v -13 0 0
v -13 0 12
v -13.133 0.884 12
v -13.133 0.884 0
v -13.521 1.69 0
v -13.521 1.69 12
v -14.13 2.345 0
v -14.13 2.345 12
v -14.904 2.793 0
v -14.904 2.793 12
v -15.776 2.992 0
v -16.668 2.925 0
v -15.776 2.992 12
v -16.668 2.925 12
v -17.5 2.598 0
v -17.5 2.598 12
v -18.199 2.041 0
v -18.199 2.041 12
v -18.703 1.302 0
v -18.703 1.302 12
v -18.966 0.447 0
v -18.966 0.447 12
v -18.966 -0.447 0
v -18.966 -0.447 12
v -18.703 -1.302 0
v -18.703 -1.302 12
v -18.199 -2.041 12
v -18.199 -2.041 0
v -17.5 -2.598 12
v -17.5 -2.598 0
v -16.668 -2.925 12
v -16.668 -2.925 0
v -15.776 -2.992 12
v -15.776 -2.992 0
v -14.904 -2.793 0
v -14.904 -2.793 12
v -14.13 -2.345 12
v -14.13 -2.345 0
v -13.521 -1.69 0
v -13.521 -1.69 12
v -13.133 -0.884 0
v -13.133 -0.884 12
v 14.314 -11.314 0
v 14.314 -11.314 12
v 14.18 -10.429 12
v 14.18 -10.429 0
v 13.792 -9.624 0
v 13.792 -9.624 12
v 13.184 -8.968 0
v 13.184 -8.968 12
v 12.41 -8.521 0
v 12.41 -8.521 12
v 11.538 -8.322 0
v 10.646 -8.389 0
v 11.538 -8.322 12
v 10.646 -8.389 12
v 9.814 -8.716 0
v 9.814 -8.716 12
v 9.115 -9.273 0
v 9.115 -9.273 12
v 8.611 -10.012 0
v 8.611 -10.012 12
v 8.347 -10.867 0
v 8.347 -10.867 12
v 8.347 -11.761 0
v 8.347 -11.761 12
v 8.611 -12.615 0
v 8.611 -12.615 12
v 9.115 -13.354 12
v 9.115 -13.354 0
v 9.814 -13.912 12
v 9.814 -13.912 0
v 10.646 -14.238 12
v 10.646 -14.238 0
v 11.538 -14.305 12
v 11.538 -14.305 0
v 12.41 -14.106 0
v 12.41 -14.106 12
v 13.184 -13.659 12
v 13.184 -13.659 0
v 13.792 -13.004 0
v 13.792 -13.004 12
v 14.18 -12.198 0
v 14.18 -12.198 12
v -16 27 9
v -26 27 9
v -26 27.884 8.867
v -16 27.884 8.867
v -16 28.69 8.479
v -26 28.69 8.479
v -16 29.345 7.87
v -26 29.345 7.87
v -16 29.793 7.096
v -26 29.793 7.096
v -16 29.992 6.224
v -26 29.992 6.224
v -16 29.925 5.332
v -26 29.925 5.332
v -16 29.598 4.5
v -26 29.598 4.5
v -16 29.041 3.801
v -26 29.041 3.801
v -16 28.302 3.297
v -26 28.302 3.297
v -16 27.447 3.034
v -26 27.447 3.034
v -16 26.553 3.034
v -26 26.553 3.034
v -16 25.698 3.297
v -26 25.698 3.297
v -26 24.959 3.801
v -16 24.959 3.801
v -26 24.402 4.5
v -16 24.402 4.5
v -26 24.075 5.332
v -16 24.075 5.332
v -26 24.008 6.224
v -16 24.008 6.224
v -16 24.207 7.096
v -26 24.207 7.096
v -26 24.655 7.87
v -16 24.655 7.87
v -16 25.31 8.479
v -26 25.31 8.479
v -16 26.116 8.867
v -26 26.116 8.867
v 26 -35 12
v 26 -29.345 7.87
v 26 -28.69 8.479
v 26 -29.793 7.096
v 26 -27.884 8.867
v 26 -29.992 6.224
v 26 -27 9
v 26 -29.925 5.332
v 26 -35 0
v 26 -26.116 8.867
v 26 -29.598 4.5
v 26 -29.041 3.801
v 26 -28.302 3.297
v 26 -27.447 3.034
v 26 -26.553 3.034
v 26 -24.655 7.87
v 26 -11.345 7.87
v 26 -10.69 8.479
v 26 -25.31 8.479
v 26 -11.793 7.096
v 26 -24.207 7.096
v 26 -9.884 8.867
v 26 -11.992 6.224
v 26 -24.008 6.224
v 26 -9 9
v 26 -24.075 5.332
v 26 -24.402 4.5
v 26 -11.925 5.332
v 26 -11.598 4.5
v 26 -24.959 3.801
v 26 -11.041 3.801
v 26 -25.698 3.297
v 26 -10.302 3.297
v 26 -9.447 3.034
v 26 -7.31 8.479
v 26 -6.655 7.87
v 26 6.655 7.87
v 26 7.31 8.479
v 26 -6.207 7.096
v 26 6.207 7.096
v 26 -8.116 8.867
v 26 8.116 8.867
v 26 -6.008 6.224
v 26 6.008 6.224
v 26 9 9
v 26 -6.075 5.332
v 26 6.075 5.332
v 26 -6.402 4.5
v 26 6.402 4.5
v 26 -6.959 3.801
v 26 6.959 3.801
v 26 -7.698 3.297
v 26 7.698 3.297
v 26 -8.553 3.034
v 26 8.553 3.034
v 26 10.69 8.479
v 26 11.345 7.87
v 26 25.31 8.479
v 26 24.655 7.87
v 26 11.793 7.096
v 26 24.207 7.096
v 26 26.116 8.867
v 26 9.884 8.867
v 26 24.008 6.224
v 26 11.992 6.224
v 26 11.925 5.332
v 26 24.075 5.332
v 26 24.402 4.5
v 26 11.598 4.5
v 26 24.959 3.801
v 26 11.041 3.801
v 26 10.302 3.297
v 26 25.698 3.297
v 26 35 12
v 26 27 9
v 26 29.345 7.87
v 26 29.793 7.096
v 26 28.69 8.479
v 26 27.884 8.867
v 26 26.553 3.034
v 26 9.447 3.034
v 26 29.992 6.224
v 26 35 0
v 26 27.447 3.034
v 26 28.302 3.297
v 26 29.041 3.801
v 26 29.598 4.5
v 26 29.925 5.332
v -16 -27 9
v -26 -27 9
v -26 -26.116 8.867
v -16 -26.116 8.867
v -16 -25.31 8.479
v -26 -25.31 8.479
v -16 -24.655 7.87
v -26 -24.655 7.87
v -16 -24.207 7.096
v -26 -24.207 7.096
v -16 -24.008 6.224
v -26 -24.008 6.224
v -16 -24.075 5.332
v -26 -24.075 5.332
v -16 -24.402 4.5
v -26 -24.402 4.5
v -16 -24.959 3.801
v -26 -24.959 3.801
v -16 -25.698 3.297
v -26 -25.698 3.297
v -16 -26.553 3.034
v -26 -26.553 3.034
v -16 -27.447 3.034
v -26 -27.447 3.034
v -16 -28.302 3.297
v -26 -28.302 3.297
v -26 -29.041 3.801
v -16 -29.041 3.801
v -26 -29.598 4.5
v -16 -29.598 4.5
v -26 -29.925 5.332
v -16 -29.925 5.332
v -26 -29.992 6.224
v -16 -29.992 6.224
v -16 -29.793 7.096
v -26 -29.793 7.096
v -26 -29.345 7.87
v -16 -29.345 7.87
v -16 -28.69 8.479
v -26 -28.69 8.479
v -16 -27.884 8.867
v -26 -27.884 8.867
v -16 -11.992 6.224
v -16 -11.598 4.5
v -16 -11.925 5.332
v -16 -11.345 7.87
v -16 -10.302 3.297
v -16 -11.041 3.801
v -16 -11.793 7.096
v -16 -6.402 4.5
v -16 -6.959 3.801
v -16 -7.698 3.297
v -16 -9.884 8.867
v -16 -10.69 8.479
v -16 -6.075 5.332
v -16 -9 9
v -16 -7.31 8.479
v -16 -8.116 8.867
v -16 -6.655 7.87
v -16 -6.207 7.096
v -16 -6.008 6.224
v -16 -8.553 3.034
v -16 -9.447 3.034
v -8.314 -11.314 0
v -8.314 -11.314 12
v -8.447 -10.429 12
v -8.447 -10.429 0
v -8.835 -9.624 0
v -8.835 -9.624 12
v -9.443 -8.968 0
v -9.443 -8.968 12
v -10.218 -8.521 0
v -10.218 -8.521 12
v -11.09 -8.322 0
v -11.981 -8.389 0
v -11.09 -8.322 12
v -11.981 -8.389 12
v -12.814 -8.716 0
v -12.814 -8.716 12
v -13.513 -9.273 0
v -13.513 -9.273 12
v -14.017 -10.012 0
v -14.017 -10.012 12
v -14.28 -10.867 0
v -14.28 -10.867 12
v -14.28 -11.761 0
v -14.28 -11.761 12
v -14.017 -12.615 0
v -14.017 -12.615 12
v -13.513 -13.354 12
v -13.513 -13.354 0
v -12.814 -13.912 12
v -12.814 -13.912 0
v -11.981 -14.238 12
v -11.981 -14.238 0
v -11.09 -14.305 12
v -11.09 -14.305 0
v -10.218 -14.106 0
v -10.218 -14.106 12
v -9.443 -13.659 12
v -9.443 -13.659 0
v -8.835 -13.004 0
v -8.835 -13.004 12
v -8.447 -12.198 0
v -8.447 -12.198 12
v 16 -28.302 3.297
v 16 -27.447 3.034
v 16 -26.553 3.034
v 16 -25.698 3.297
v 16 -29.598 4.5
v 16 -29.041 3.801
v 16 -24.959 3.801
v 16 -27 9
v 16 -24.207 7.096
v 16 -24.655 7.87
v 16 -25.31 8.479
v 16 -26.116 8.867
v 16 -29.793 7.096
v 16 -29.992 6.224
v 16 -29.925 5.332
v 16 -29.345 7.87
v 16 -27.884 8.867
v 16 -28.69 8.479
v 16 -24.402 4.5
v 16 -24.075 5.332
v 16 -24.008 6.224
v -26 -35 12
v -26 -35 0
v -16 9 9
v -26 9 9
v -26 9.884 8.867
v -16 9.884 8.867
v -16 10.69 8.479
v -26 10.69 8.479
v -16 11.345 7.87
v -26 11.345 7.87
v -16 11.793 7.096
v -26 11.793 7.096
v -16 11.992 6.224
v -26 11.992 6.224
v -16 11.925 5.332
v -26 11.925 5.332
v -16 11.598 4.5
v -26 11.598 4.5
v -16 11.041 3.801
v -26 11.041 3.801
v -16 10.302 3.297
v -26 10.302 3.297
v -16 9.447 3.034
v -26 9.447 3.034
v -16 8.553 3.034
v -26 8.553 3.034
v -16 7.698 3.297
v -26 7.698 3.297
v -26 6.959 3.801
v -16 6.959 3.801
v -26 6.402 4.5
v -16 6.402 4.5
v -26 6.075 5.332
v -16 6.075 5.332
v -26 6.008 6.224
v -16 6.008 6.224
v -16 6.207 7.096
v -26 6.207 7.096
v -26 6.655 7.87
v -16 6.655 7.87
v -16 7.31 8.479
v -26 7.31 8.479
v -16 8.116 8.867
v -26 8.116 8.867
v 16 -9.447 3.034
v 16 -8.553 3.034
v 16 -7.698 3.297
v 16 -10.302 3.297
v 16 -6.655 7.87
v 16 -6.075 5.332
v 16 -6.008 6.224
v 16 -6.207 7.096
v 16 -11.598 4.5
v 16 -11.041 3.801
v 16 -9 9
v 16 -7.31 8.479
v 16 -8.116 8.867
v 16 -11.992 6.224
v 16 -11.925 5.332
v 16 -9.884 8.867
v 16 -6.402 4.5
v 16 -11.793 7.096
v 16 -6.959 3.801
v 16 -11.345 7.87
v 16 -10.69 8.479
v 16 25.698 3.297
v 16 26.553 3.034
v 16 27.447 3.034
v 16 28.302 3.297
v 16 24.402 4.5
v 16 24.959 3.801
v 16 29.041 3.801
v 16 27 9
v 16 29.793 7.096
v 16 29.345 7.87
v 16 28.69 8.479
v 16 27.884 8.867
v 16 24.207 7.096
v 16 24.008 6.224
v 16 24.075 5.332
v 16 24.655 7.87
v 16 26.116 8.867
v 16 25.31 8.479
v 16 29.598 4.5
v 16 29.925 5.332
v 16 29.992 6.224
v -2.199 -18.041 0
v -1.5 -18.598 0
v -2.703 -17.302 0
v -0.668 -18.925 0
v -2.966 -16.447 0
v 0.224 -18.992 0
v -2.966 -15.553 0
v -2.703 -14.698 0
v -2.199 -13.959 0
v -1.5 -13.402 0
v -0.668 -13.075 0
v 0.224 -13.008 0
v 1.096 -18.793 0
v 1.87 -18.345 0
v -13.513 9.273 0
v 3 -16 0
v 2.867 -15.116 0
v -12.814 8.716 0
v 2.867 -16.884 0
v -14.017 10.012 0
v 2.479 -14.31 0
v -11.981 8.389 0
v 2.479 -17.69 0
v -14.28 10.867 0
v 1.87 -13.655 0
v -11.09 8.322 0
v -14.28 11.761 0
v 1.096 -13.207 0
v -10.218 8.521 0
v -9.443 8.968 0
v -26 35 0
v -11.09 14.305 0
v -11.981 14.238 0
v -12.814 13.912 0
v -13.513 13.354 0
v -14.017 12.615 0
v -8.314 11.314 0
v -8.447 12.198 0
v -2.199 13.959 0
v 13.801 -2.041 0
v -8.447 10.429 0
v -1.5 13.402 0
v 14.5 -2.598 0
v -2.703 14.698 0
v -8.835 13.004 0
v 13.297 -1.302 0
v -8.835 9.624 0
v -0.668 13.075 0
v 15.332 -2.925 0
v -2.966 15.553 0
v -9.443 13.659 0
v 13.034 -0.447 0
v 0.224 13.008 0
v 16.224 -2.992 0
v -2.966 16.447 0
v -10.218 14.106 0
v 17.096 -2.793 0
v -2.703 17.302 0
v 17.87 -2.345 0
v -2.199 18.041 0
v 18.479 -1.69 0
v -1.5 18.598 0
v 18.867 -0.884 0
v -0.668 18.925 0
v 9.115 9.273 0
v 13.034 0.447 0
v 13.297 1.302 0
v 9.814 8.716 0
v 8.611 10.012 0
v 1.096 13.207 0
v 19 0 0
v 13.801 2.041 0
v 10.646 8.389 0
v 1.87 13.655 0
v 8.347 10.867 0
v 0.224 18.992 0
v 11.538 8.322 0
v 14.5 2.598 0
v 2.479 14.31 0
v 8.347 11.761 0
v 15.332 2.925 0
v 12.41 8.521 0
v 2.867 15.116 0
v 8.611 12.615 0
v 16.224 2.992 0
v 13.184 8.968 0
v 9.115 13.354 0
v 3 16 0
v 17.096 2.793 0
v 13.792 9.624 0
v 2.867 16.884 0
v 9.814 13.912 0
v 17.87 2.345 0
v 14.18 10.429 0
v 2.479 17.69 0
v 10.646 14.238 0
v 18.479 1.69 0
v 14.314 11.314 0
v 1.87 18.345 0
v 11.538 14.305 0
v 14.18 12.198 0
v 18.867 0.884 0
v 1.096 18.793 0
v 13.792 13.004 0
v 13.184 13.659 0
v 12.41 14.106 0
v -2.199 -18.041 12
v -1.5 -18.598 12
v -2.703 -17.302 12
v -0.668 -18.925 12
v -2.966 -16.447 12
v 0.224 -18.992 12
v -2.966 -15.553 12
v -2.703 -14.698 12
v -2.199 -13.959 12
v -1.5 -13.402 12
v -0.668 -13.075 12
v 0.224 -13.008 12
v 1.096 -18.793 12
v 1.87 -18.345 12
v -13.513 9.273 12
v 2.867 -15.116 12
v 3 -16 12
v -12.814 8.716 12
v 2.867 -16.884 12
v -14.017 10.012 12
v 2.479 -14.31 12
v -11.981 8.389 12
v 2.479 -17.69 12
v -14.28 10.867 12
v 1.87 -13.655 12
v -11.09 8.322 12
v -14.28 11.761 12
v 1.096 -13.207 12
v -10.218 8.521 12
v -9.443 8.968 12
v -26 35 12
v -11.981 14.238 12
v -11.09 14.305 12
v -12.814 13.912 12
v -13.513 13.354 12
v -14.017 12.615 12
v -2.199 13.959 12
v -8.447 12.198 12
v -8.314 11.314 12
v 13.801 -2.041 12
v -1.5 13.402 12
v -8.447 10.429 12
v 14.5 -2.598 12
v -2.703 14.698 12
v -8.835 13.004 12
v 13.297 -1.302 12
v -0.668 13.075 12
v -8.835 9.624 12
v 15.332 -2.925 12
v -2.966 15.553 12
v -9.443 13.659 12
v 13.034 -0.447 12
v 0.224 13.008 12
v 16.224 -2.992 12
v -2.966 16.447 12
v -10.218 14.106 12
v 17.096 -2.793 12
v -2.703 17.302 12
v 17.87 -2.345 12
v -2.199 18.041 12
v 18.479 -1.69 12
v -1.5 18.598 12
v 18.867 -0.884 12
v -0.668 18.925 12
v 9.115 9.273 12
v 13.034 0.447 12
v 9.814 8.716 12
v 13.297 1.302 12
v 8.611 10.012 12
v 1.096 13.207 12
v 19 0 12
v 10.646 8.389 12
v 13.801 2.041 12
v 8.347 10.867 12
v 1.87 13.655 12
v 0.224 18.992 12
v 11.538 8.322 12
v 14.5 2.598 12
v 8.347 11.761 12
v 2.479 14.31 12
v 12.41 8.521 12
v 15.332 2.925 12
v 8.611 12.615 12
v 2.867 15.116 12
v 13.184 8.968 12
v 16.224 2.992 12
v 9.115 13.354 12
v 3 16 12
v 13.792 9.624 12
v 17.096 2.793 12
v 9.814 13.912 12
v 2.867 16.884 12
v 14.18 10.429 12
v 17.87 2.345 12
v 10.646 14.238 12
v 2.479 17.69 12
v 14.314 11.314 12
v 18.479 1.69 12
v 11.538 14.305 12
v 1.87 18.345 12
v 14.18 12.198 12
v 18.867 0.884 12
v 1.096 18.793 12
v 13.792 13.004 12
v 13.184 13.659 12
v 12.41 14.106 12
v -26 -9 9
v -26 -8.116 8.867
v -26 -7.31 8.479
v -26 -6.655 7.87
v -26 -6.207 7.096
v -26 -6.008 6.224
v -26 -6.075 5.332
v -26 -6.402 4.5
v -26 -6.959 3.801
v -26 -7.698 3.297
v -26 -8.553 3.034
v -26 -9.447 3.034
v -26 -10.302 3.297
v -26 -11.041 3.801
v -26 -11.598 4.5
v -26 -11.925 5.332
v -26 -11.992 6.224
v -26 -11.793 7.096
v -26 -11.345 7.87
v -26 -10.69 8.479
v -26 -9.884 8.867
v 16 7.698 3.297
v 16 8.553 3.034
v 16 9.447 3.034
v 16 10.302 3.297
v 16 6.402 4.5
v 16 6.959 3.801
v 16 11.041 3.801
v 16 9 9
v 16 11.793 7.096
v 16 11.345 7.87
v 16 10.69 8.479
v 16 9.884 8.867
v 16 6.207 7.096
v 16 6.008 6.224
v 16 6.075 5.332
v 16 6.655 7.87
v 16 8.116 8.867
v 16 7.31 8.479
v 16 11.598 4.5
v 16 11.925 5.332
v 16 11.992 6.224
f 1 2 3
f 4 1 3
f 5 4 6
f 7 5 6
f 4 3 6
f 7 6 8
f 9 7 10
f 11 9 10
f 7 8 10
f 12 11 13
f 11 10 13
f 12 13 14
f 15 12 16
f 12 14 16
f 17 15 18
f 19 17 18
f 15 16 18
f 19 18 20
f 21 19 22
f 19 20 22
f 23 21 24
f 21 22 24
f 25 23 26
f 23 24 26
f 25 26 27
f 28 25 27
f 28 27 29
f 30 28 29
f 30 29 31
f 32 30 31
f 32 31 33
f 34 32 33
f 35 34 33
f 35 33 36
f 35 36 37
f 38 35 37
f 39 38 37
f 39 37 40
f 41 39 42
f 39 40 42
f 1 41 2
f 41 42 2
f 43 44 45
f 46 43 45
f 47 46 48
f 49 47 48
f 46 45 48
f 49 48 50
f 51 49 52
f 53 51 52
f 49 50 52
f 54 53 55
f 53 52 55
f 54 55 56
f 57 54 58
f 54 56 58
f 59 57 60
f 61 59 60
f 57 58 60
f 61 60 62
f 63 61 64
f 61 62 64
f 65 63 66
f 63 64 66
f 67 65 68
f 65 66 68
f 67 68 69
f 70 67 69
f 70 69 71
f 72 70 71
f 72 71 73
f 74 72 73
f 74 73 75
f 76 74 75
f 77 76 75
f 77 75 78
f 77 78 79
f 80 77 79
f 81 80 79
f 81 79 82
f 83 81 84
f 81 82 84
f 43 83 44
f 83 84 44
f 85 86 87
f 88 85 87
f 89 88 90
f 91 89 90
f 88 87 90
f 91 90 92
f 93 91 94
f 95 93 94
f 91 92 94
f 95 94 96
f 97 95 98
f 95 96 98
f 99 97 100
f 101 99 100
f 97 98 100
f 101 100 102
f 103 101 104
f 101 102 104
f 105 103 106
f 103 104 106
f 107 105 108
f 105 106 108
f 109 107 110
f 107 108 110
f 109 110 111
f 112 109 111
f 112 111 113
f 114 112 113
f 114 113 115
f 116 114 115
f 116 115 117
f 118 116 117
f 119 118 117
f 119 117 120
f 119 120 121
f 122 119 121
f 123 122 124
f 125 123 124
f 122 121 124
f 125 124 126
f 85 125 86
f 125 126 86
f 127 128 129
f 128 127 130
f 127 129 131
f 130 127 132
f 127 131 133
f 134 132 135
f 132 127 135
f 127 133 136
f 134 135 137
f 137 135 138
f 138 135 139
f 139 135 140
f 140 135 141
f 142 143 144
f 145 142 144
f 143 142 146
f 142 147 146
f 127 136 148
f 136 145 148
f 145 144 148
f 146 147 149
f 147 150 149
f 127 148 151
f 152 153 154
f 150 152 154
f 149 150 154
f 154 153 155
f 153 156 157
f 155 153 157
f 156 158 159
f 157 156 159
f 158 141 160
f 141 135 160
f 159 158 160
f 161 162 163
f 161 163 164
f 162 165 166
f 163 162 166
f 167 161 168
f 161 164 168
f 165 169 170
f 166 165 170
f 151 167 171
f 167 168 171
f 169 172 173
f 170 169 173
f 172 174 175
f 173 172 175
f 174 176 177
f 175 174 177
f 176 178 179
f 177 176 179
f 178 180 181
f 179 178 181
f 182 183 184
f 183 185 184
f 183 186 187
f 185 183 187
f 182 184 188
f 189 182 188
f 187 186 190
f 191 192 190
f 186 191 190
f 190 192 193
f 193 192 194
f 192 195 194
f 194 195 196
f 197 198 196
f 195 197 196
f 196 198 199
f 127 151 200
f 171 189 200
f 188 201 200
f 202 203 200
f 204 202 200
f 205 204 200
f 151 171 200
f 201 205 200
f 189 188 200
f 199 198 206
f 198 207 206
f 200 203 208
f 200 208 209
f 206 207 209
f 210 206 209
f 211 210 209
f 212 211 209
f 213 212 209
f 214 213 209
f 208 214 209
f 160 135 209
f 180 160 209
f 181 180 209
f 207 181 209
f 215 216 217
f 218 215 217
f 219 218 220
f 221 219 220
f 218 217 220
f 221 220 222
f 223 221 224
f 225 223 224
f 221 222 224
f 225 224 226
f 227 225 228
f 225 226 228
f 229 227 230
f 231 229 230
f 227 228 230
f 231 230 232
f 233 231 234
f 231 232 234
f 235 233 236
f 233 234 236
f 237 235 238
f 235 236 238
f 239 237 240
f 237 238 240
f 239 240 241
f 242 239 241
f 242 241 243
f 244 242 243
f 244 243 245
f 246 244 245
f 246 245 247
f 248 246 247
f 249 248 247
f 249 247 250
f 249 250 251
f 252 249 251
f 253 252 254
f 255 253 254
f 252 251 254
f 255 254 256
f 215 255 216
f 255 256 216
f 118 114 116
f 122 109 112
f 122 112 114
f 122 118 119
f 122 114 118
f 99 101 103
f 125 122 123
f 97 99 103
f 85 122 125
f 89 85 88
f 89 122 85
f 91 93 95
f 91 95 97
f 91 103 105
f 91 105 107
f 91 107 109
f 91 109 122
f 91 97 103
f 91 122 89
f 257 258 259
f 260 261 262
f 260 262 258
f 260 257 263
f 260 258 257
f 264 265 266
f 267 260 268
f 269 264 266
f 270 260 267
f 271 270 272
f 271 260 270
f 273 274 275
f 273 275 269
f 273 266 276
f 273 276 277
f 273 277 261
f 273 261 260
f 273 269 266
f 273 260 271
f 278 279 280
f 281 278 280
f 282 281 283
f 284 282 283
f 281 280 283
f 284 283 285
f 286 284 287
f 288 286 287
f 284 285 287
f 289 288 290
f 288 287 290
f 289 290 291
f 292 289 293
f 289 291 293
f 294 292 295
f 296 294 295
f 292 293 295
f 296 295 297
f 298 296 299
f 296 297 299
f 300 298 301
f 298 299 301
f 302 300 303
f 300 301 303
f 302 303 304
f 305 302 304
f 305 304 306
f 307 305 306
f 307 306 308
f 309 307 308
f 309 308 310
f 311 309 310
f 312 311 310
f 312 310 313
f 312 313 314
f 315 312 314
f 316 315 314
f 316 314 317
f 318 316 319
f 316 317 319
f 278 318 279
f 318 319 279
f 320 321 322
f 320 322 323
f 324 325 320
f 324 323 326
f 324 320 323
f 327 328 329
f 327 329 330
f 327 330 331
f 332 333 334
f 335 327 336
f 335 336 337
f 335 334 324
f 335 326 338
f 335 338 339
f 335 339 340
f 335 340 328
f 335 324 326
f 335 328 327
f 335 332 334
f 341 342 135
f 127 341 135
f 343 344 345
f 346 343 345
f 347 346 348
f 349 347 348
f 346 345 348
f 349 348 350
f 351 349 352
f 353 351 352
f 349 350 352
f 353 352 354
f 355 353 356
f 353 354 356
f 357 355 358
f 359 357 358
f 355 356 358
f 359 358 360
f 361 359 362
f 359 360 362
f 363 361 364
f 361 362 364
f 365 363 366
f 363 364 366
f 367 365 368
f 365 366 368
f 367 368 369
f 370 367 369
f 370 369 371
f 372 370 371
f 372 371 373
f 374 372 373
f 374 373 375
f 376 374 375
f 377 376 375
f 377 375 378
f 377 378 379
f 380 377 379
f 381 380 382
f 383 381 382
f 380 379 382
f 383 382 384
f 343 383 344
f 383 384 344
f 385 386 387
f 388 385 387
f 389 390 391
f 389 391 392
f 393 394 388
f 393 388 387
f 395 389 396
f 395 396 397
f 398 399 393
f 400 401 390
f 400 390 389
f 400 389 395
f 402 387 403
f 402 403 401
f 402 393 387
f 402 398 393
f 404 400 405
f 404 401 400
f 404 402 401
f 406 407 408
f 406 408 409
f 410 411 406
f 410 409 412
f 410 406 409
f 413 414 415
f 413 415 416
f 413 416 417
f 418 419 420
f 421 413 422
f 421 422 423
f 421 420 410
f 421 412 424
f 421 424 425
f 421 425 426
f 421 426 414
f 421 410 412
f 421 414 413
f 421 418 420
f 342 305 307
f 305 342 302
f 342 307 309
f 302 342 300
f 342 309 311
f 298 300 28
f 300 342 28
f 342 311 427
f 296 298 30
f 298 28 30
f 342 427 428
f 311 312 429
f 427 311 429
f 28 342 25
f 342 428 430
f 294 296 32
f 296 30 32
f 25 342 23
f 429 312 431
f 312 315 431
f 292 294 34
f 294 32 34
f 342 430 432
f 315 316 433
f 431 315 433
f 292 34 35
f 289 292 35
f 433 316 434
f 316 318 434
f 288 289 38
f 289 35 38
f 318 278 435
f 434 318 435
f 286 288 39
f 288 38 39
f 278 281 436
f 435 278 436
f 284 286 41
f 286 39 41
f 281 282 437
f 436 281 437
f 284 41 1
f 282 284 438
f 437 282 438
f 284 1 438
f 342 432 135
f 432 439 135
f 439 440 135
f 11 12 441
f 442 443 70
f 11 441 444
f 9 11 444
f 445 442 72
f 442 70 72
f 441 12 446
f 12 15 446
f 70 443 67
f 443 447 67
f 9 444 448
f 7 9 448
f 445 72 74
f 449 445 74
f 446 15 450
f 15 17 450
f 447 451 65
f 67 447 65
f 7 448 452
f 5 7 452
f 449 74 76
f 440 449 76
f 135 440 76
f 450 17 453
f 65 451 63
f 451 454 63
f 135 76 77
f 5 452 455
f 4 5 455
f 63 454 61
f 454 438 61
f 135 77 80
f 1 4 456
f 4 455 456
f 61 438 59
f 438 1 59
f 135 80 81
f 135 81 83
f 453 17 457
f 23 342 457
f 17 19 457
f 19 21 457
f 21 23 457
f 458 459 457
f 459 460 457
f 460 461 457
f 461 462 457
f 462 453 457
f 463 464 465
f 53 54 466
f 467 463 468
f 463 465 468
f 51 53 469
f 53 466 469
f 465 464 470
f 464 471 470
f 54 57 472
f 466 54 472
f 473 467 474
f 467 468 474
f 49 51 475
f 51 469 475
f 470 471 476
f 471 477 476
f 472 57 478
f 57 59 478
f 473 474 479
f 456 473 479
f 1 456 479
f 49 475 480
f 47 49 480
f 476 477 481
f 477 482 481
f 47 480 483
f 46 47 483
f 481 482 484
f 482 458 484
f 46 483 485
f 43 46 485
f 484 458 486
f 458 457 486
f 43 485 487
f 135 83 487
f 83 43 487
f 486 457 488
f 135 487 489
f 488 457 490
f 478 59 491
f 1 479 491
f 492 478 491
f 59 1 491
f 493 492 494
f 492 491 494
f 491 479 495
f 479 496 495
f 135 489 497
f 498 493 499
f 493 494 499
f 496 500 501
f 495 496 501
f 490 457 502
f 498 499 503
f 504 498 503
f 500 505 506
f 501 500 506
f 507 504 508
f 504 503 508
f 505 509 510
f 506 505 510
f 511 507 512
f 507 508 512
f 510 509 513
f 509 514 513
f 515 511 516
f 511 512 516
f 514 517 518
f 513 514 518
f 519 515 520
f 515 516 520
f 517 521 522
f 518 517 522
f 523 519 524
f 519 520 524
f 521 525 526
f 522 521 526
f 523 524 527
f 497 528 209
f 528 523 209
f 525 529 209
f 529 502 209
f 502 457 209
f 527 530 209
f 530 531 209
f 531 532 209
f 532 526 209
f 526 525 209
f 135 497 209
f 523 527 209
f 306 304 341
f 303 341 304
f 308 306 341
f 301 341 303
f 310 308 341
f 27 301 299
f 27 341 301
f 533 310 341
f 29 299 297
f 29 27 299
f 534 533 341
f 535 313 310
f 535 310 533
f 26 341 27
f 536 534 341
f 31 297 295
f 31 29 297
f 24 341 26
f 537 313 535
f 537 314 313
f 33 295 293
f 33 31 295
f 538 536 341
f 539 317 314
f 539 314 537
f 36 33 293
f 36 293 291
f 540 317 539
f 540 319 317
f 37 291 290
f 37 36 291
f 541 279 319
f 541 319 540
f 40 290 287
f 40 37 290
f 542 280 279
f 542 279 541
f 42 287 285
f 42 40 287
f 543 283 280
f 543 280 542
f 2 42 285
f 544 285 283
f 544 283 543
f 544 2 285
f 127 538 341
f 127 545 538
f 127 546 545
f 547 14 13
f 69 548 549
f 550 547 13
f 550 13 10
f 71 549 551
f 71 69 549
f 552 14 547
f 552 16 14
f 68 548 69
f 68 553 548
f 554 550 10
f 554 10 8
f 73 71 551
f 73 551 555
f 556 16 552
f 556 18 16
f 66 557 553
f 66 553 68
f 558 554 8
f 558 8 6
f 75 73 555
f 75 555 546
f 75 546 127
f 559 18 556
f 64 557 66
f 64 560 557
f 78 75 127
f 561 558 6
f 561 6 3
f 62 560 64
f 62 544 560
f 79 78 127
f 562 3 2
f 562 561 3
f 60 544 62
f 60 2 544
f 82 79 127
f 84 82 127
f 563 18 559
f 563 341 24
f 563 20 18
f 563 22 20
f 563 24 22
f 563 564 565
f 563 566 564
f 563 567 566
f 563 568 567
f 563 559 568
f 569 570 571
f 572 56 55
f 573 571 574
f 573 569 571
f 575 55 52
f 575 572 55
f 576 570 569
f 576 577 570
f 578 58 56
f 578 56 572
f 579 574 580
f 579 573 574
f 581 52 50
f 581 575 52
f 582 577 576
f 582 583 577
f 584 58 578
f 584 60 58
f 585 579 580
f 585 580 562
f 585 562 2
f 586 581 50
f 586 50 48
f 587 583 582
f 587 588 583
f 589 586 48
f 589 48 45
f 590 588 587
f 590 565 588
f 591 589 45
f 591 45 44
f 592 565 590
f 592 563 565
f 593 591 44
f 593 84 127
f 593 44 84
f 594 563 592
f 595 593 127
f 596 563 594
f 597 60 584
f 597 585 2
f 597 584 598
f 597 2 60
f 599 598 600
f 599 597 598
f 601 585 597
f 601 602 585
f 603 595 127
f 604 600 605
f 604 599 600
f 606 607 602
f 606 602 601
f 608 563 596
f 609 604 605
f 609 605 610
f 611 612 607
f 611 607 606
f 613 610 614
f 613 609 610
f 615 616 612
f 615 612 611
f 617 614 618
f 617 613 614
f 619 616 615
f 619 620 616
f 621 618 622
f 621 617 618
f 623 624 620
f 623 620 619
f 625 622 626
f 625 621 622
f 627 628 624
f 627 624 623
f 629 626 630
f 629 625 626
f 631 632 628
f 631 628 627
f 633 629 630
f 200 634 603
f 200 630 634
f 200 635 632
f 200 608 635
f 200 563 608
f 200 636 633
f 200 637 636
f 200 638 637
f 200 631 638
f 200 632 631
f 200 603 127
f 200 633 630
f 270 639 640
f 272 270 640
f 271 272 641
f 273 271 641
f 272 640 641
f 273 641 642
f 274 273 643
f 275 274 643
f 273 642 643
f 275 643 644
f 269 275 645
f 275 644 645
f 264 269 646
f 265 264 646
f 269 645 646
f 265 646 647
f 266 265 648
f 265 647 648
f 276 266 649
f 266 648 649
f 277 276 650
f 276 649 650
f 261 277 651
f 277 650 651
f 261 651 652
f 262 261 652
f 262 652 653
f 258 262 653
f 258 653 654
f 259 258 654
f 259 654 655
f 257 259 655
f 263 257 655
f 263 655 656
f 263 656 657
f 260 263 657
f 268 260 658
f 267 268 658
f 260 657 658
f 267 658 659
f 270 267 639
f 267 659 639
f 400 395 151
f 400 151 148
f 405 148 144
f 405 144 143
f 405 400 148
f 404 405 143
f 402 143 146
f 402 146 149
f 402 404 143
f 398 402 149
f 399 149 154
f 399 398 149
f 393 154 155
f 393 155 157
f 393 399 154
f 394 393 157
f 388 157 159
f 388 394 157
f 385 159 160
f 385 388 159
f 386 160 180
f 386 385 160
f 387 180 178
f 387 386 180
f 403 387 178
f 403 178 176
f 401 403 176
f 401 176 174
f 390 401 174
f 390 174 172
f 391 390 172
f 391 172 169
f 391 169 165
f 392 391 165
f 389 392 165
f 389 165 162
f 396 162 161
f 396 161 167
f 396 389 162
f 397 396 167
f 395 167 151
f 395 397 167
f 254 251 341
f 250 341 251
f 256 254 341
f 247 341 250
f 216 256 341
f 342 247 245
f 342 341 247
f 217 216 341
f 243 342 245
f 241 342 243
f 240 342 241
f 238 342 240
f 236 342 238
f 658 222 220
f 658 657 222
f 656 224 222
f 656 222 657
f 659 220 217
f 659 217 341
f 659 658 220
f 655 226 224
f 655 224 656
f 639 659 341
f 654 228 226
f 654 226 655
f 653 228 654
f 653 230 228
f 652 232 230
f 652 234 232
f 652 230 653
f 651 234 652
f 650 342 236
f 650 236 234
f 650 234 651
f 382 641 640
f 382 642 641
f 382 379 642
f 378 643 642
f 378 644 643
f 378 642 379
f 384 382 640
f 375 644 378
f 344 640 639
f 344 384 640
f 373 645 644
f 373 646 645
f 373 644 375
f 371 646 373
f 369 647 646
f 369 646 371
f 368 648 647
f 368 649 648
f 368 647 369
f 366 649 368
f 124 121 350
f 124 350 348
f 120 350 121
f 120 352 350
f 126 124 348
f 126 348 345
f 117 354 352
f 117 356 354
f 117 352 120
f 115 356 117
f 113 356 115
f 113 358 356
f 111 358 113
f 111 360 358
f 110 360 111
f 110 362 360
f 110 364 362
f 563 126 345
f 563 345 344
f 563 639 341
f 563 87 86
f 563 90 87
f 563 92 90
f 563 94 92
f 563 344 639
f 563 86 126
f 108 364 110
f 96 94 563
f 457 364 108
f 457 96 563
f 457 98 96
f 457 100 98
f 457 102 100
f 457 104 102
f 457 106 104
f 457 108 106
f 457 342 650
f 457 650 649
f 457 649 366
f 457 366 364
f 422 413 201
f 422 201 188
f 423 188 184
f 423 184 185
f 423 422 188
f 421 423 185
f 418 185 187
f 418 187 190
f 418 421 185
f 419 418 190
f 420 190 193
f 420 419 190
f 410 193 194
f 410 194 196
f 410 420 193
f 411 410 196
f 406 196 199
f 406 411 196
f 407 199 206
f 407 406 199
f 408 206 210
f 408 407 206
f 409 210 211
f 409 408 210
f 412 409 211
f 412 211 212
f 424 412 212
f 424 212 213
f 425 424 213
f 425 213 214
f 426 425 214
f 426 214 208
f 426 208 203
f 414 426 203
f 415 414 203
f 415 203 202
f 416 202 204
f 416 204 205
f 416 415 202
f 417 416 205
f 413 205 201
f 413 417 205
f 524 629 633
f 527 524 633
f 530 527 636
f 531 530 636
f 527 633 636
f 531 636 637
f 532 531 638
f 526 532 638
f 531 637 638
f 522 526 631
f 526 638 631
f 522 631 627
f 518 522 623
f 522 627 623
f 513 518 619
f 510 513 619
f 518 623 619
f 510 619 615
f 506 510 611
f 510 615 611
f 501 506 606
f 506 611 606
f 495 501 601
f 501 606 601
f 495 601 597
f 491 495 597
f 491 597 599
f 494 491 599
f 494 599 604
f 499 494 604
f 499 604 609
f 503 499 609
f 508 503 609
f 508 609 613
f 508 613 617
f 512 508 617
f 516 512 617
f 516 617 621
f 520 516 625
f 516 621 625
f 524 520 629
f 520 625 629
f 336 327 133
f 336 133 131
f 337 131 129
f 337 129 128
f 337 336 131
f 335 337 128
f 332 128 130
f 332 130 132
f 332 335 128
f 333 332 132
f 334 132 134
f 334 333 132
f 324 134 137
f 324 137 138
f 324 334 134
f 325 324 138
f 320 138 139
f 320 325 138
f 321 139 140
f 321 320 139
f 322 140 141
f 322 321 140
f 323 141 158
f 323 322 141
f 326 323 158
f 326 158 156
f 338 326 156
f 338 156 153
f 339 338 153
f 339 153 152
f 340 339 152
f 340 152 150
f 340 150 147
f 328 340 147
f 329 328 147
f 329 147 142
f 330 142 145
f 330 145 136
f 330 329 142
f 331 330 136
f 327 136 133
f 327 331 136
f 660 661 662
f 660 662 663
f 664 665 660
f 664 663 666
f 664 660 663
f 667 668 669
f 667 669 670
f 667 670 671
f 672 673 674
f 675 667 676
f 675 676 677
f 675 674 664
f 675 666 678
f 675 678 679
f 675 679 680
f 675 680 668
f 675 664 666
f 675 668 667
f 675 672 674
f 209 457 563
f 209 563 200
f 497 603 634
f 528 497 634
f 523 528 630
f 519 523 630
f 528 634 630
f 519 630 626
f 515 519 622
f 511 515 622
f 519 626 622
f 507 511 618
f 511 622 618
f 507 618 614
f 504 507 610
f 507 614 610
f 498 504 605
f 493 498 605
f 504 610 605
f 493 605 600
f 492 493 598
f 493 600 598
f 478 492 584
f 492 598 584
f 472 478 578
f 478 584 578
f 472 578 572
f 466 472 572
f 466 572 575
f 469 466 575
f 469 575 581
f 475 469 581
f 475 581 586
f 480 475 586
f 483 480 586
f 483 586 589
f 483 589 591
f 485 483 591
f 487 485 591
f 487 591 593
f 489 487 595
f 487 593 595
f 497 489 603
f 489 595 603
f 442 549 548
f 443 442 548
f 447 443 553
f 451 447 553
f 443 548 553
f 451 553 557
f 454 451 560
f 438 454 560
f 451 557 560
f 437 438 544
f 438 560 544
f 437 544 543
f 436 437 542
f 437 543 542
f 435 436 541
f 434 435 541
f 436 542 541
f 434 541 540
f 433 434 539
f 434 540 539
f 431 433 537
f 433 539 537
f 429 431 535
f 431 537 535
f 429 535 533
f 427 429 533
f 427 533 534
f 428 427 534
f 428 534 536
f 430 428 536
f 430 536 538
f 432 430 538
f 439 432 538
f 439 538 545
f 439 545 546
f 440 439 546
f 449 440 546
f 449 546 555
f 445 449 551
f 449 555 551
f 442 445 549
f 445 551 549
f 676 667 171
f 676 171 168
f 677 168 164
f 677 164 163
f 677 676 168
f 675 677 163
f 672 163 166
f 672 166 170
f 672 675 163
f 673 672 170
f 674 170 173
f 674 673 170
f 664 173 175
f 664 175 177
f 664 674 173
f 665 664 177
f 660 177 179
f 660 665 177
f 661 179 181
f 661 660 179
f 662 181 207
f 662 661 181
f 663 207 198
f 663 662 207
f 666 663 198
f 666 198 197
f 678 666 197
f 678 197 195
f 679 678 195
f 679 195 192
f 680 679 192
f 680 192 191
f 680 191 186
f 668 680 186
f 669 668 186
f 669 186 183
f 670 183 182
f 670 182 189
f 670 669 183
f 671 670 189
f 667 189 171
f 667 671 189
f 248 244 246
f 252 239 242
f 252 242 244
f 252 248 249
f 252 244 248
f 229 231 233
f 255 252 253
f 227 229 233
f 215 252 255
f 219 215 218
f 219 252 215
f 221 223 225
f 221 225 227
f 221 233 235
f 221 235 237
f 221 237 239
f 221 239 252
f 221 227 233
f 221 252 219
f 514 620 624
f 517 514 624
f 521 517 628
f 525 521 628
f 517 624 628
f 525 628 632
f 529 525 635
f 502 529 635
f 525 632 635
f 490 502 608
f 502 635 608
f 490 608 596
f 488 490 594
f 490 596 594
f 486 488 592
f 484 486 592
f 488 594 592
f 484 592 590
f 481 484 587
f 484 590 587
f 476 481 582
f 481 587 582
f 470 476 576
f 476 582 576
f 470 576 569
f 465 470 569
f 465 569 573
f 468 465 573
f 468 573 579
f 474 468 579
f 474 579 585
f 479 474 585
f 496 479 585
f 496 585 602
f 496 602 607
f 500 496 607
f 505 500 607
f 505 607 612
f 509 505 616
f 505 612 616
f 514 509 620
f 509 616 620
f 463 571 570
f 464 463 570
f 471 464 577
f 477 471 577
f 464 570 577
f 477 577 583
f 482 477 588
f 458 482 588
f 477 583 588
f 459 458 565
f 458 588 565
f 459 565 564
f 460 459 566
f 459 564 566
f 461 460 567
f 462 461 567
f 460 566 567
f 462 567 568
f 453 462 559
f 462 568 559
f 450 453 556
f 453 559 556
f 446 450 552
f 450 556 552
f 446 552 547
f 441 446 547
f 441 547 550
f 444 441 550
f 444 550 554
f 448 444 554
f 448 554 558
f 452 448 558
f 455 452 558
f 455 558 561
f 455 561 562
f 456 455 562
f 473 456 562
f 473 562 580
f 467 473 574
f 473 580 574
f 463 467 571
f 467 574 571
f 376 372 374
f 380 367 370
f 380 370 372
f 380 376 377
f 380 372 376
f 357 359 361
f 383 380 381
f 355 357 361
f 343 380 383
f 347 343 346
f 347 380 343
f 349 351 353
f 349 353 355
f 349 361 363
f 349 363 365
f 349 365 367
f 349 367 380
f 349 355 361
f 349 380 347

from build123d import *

# Parameters (mm, degrees)
SKETCH_1_W          = 52
SKETCH_1_H          = 70
EXTRUDE_1_DEPTH     = 12
SKETCH_2_R          = 3
CUT_EXTRUDE_1_DEPTH = 10
CUT_EXTRUDE_START   = -10
SKETCH_3_R          = 3
CUT_EXTRUDE_2_DEPTH = 10
SKETCH_4_R          = 3
CUT_EXTRUDE_3_DEPTH = 12


with BuildPart() as part:
    # 草图1 → 凸台-拉伸1 (new body)
    with BuildSketch(Plane.XY):
        Rectangle(SKETCH_1_W, SKETCH_1_H)
    extrude(amount=EXTRUDE_1_DEPTH)

    # 草图2 → 切除-拉伸1 (cut)
    with BuildSketch(Plane.ZY.offset(26)):
        with Locations((6, 27)):
            Circle(SKETCH_2_R)
        with Locations((6, 9)):
            Circle(SKETCH_2_R)
        with Locations((6, -9)):
            Circle(SKETCH_2_R)
        with Locations((6, -27)):
            Circle(SKETCH_2_R)
    extrude(amount=-CUT_EXTRUDE_1_DEPTH, mode=Mode.SUBTRACT)

    # 草图3 → 切除-拉伸2 (cut)
    with BuildSketch(Plane(origin=(26, 0, 0), x_dir=(0, 0, -1), z_dir=(1, 0, 0)).offset(CUT_EXTRUDE_START)):
        with Locations(Location((-6, 27, 0), (0, 0, 180))):
            Circle(SKETCH_3_R)
        with Locations(Location((-6, 9, 0), (0, 0, 180))):
            Circle(SKETCH_3_R)
        with Locations(Location((-6, -9, 0), (0, 0, 180))):
            Circle(SKETCH_3_R)
        with Locations(Location((-6, -27, 0), (0, 0, 180))):
            Circle(SKETCH_3_R)
    extrude(amount=CUT_EXTRUDE_2_DEPTH, mode=Mode.SUBTRACT)

    # 草图4 → 切除-拉伸3 (cut)
    with BuildSketch(Plane.XY.offset(12)):
        with Locations((16, 0)):
            Circle(SKETCH_4_R)
        with Locations((11.313708499, -11.313708499)):
            Circle(SKETCH_4_R)
        with Locations((0, -16)):
            Circle(SKETCH_4_R)
        with Locations((-11.313708499, -11.313708499)):
            Circle(SKETCH_4_R)
        with Locations((-16, 0)):
            Circle(SKETCH_4_R)
        with Locations((-11.313708499, 11.313708499)):
            Circle(SKETCH_4_R)
        with Locations((0, 16)):
            Circle(SKETCH_4_R)
        with Locations((11.313708499, 11.313708499)):
            Circle(SKETCH_4_R)
    extrude(amount=-CUT_EXTRUDE_3_DEPTH, mode=Mode.SUBTRACT)


solid = part.part
